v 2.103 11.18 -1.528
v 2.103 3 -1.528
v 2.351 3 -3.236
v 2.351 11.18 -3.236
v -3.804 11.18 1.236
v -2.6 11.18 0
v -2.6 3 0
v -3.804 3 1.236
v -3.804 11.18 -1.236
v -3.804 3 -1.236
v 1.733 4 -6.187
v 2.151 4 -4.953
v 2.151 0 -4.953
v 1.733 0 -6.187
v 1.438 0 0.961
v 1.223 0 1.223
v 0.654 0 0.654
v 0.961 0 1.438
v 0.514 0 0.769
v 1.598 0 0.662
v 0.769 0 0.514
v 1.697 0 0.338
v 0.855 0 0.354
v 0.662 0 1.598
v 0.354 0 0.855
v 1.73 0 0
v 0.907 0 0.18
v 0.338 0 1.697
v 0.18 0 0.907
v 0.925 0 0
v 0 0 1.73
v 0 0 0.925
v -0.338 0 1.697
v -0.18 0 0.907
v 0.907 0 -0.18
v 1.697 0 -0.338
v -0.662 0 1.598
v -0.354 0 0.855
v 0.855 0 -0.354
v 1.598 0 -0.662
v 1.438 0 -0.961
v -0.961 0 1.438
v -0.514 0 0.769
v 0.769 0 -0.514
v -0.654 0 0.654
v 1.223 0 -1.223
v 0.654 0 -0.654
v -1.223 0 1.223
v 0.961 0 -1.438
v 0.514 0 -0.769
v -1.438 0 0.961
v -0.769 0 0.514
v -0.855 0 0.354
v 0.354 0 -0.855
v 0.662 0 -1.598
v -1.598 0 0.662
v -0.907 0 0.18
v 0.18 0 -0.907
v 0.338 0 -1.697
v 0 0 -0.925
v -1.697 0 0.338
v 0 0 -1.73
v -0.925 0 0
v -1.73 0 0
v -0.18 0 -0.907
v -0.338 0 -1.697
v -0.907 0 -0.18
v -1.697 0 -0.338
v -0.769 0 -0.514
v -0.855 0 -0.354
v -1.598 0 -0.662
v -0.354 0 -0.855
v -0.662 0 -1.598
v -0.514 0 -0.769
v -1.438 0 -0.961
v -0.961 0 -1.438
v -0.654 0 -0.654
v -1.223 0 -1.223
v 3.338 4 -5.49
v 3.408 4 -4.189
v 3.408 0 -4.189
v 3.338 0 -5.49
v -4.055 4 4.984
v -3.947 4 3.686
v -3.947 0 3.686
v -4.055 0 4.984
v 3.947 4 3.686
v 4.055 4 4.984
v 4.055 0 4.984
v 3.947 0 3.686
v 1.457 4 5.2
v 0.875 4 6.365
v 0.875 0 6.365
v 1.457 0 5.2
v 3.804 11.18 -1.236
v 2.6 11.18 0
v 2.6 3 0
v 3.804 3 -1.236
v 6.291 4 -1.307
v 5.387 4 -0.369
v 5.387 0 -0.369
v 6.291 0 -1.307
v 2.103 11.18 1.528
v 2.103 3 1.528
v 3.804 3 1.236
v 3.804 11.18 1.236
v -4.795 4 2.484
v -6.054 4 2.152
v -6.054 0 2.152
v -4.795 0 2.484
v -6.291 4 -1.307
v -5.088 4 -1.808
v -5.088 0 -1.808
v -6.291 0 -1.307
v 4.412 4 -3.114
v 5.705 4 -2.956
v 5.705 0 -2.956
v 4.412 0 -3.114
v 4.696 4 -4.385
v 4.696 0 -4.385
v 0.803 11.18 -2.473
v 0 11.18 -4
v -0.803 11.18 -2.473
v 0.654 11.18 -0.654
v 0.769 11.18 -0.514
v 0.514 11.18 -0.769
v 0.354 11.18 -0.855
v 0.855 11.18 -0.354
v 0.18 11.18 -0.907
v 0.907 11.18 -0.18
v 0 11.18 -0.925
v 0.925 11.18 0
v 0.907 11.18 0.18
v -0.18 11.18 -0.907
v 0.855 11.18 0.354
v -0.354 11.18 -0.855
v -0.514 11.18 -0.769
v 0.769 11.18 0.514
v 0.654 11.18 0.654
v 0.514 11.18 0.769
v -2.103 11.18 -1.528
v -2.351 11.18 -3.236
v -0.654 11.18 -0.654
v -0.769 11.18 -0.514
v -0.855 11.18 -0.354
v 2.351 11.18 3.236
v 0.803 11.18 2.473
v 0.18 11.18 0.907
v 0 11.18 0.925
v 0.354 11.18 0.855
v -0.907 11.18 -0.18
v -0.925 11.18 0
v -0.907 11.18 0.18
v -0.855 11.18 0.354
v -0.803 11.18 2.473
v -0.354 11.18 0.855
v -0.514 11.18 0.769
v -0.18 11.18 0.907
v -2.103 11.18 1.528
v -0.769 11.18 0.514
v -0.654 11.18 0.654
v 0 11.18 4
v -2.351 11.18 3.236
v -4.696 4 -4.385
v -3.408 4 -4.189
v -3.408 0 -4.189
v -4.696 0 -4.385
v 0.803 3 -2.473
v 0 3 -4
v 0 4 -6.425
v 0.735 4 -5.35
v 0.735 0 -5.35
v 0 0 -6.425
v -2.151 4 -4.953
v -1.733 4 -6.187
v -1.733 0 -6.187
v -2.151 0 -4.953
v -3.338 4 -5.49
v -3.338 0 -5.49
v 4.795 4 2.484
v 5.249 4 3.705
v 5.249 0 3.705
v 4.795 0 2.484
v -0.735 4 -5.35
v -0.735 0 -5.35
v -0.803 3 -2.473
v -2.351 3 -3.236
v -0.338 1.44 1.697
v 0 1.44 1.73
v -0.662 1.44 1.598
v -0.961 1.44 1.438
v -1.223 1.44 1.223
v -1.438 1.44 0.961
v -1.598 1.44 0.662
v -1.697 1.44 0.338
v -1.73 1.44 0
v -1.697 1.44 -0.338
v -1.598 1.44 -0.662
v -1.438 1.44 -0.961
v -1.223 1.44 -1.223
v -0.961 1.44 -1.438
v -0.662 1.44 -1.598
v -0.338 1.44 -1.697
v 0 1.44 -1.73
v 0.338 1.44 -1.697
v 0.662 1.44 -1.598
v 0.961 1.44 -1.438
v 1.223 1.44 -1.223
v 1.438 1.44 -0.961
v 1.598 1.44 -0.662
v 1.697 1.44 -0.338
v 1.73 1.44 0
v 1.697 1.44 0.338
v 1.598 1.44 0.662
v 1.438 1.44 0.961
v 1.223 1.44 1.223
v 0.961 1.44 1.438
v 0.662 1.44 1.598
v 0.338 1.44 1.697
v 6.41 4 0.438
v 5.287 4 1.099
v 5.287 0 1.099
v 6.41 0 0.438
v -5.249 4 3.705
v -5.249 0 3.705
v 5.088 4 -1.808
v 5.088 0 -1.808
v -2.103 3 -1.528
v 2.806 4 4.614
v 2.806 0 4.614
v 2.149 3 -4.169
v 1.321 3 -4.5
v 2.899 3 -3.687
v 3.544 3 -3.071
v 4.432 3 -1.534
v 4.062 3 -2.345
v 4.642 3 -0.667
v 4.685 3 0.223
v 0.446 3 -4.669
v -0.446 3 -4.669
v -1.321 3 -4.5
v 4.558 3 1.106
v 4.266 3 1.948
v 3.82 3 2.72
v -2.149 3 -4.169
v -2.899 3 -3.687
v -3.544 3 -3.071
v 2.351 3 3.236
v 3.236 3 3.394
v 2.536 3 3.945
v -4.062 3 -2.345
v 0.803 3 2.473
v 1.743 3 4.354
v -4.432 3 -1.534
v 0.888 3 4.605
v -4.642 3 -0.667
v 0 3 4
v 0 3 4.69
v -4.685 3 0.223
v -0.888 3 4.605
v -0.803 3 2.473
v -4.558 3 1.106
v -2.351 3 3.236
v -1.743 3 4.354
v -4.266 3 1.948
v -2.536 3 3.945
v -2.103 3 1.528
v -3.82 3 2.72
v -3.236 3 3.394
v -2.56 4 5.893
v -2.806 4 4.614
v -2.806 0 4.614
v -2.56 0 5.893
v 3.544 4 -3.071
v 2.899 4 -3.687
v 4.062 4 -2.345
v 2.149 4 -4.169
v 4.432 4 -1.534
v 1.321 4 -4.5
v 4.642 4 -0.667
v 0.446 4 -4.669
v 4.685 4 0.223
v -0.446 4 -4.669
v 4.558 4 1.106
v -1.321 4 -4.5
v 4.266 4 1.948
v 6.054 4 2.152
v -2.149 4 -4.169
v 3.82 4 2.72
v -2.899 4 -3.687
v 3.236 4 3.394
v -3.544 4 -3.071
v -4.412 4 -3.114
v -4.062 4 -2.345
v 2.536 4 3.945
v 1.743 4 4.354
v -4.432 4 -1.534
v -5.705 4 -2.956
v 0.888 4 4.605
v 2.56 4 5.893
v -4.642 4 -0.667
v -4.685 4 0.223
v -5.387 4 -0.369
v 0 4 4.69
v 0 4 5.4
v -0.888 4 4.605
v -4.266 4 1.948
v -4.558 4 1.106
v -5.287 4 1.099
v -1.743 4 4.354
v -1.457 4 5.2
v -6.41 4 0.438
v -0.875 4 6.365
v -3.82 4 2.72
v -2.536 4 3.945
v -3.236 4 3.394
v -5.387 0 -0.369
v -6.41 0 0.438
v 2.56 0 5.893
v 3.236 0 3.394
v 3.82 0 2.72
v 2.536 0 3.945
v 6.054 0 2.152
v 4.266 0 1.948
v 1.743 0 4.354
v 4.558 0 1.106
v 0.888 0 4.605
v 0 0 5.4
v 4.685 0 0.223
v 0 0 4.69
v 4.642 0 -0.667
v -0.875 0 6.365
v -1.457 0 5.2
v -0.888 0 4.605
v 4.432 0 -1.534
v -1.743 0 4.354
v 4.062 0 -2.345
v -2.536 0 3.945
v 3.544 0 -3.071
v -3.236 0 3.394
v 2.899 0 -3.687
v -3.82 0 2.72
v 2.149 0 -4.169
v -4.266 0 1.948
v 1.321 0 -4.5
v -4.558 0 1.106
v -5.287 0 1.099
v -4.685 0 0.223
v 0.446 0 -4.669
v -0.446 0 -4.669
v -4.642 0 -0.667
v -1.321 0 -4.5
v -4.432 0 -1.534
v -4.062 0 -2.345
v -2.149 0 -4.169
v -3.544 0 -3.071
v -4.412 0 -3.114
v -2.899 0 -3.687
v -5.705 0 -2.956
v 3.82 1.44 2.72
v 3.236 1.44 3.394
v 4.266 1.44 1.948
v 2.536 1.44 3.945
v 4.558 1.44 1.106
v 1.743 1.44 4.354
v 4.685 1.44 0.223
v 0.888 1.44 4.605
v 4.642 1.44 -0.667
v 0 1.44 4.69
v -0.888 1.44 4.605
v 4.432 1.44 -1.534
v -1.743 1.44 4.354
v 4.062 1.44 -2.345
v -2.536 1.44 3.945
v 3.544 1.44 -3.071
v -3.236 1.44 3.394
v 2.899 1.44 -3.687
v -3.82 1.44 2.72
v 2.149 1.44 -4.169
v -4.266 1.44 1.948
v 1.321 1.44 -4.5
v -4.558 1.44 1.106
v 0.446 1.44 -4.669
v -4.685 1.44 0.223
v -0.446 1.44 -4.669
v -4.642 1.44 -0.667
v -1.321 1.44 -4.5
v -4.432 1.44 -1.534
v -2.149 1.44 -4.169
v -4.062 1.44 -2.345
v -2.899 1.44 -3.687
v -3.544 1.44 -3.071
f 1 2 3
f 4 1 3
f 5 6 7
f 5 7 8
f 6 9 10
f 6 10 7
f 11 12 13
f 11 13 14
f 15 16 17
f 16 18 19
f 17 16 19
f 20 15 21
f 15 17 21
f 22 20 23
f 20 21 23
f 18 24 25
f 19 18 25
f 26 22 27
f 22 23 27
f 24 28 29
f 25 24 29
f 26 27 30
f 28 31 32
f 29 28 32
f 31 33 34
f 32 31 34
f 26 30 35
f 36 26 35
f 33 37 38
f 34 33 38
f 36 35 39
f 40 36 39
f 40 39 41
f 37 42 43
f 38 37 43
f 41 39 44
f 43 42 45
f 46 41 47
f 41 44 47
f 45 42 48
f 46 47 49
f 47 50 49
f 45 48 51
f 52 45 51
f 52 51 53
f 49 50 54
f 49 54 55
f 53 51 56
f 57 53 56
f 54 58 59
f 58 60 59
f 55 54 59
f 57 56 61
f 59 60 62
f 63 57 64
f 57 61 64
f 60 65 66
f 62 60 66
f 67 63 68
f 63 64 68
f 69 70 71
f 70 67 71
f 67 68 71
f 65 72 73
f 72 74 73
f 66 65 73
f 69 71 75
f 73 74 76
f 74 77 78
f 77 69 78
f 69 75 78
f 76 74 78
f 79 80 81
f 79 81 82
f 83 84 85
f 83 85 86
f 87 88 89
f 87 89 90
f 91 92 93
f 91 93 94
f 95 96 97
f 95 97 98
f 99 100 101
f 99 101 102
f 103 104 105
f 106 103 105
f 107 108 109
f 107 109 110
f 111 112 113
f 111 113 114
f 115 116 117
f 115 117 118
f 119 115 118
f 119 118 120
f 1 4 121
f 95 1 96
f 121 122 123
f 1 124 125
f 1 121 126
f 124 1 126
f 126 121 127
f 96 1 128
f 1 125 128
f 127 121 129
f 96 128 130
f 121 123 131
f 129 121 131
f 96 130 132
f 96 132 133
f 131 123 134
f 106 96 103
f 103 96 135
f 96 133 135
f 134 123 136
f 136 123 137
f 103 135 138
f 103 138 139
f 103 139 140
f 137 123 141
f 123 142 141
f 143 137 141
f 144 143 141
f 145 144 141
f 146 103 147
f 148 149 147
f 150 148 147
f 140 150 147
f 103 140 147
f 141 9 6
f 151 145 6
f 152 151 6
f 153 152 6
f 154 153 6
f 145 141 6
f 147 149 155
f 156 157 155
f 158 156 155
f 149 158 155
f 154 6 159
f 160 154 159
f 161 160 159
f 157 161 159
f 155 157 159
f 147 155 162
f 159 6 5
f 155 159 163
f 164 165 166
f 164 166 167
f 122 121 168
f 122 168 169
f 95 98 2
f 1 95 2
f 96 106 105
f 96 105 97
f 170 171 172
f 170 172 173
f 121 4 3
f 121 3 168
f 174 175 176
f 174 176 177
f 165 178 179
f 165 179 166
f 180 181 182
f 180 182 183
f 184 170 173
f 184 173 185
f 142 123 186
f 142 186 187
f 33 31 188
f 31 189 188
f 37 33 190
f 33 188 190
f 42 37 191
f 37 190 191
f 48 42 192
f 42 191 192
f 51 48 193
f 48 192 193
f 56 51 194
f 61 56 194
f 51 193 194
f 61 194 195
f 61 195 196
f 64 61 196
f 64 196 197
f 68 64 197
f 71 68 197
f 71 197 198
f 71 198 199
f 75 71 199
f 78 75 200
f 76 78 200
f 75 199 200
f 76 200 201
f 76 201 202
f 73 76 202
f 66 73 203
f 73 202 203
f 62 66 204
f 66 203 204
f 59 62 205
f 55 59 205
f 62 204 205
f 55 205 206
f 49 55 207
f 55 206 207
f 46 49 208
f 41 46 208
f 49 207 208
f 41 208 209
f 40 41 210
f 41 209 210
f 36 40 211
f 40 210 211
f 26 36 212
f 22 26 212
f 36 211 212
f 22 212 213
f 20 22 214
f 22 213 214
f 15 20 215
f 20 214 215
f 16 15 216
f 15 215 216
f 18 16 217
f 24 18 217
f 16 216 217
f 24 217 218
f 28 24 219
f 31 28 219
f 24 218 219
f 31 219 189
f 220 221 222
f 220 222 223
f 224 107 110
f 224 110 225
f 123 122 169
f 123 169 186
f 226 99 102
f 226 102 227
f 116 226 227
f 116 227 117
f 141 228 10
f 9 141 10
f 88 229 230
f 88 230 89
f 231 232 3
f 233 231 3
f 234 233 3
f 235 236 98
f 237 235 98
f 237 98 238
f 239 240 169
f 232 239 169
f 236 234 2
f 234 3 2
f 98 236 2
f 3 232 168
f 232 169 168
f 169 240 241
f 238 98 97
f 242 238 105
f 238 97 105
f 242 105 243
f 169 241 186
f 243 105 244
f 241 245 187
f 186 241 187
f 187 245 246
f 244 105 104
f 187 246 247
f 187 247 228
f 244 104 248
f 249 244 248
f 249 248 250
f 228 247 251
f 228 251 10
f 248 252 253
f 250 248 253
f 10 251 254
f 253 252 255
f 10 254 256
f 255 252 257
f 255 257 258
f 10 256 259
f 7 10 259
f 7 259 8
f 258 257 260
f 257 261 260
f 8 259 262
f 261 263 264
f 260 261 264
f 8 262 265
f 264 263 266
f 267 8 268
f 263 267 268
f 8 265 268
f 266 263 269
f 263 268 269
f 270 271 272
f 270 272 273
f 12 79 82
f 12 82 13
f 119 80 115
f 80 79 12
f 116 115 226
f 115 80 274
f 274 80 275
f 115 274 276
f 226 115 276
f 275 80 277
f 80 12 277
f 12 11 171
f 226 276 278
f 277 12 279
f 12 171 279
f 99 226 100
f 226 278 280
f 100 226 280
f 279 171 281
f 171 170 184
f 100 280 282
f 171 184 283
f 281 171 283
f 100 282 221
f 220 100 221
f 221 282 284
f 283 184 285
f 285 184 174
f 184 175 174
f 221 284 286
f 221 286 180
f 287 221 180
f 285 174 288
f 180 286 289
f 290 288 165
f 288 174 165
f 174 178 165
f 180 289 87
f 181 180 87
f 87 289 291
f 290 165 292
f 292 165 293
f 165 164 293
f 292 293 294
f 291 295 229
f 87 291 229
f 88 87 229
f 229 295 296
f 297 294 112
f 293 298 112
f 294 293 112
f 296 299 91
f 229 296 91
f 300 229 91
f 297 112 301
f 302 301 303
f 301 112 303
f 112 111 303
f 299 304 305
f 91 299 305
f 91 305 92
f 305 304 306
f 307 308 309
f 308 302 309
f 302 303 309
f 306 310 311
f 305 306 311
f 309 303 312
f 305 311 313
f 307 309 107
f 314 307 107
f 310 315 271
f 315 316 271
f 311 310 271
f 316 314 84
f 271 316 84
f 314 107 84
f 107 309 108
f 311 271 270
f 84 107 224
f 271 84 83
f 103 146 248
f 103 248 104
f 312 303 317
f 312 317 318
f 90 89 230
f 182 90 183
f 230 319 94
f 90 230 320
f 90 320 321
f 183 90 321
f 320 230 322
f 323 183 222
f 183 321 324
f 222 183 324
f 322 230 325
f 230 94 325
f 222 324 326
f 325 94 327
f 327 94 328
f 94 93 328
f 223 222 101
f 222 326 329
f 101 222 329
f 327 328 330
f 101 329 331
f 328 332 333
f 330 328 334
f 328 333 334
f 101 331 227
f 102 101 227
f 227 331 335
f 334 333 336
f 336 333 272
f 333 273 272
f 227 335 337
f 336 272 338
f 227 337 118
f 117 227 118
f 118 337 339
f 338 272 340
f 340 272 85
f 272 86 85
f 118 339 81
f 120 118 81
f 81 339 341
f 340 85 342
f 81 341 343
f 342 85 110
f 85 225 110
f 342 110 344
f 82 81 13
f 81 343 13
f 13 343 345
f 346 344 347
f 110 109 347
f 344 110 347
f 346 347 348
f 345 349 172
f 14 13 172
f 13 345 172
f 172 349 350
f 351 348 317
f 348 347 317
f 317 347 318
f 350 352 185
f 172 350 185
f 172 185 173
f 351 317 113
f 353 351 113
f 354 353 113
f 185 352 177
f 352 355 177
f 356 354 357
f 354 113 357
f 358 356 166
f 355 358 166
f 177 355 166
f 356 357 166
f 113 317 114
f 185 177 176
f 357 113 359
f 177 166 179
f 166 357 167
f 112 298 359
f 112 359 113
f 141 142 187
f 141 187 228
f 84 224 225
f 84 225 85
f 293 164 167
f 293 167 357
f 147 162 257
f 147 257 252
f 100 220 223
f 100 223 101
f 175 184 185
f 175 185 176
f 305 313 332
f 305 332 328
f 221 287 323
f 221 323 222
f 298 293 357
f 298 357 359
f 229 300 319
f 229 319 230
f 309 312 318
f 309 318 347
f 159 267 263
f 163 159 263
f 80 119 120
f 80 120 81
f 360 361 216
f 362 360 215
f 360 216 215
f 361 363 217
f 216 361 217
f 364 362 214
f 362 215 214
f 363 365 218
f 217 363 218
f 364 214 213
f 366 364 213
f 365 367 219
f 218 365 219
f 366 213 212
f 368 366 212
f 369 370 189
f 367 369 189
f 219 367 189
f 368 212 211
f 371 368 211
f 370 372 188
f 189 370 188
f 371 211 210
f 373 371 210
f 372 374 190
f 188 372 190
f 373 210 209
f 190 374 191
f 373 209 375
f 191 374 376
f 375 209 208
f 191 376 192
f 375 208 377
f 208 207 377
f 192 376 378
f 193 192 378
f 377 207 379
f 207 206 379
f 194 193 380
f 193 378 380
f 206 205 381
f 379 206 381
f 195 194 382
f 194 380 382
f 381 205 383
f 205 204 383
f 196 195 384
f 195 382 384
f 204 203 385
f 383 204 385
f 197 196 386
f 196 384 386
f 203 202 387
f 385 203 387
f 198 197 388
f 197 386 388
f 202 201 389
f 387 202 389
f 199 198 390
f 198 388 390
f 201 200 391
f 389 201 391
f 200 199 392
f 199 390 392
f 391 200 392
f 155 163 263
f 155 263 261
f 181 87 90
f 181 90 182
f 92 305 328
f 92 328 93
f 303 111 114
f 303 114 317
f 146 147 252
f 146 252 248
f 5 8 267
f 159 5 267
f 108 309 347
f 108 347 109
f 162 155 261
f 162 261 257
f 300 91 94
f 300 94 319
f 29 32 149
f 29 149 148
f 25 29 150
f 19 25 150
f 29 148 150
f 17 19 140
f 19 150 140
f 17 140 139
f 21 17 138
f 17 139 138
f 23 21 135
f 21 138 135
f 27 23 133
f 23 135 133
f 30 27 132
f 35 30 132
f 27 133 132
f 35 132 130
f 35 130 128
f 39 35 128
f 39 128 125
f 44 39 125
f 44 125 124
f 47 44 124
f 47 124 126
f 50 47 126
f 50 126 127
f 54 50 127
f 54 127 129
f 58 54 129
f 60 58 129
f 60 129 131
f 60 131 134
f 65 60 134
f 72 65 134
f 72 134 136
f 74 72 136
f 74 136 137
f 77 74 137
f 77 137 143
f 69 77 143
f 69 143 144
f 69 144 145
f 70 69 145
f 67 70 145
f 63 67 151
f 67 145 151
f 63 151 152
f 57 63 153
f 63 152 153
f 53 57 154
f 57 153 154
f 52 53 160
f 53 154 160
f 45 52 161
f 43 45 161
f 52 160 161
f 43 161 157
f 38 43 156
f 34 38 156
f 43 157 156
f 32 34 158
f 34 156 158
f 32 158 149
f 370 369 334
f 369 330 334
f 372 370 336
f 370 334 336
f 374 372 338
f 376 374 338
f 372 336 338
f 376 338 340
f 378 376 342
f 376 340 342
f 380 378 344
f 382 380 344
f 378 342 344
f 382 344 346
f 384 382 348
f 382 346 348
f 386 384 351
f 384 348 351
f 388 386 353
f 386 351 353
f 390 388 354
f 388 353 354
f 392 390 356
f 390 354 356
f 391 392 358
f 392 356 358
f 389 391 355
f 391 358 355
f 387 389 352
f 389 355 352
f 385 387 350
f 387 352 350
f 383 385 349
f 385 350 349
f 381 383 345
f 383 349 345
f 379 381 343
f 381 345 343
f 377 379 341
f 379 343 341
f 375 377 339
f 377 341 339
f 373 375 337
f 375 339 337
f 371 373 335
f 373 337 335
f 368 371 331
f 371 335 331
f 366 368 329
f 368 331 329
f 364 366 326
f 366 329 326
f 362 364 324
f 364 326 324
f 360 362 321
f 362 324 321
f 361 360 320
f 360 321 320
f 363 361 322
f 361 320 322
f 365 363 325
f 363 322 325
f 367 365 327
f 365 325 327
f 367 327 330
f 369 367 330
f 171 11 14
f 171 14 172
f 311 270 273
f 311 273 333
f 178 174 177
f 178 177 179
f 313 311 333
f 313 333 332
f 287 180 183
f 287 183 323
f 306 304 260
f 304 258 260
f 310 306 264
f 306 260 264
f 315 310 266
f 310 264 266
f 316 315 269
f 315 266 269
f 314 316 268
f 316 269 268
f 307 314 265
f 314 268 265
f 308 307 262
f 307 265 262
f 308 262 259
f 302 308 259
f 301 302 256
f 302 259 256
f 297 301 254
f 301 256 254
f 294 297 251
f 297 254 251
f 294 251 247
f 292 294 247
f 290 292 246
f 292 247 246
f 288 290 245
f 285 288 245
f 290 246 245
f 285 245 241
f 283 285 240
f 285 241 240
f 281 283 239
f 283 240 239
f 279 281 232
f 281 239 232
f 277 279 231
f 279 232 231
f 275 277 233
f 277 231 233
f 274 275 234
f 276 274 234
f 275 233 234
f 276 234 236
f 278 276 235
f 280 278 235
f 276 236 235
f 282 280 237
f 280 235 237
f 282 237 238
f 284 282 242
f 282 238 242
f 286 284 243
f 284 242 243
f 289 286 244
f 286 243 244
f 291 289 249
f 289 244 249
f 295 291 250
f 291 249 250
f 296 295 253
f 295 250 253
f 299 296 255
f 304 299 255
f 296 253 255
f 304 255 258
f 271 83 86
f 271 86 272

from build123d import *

# Parameters (mm, degrees)
SKETCH2_R          = 6.925
CUT_EXTRUDE1_DEPTH = 12.580744795
SKETCH3_R          = 4.5
CUT_EXTRUDE2_DEPTH = 8.18
SKETCH4_R          = 0.925
CUT_EXTRUDE3_DEPTH = 15.400048785


with BuildPart() as part:
    # Sketch1 → Revolve1 (revolve)
    with BuildSketch(Plane.XY, mode=Mode.PRIVATE) as revolve1_sk:
        Polygon((0, 11.18), (0, 0), (1.73, 0), (1.73, 1.44), (4.69, 1.44), (4.69, 0), (6.425, 0), (6.425, 4), (4.69, 4), (4.69, 3), (4, 3), (4, 11.18), align=None)
    revolve(revolve1_sk.sketch.rotate(Axis((0, 11.18, 0), (0, -1, 0)), 90), axis=Axis((0, 11.18, 0), (0, -1, 0)))

    # Sketch2 → Cut-Extrude1 (cut, through all)
    with BuildSketch(Plane(origin=(0, 4, 0), x_dir=(1, 0, 0), z_dir=(0, 1, 0))):
        Circle(SKETCH2_R)
        Polygon((0, 6.425), (-0.735299905, 5.349704109), (-1.733444255, 6.186743571), (-2.151365885, 4.952941028), (-3.338326879, 5.489644674), (-3.407874899, 4.18884097), (-4.69562107, 4.385403945), (-4.411637422, 3.114073739), (-5.704662528, 2.955917867), (-5.088208979, 1.808349906), (-6.290615263, 1.307204884), (-5.387411354, 0.368509032), (-6.410021842, -0.438457506), (-5.287054073, -1.09866247), (-6.054026425, -2.151601508), (-4.794580179, -2.484351204), (-5.249031563, -3.70517107), (-3.946514207, -3.685786973), (-4.054740042, -4.983945043), (-2.80575333, -4.613864785), (-2.559727002, -5.893082612), (-1.456902564, -5.199753352), (-0.87487072, -6.365157203), (0, -5.4), (0.87487072, -6.365157203), (1.456902564, -5.199753352), (2.559727002, -5.893082612), (2.80575333, -4.613864785), (4.054740042, -4.983945043), (3.946514207, -3.685786973), (5.249031563, -3.70517107), (4.794580179, -2.484351204), (6.054026425, -2.151601508), (5.287054073, -1.09866247), (6.410021842, -0.438457506), (5.387411354, 0.368509032), (6.290615263, 1.307204884), (5.088208979, 1.808349906), (5.704662528, 2.955917867), (4.411637422, 3.114073739), (4.69562107, 4.385403945), (3.407874899, 4.18884097), (3.338326879, 5.489644674), (2.151365885, 4.952941028), (1.733444255, 6.186743571), (0.735299905, 5.349704109), align=None, mode=Mode.SUBTRACT)
    extrude(amount=-CUT_EXTRUDE1_DEPTH, mode=Mode.SUBTRACT)

    # Sketch3 → Cut-Extrude2 (cut)
    with BuildSketch(Plane(origin=(0, 11.18, 0), x_dir=(1, 0, 0), z_dir=(0, 1, 0))):
        Circle(SKETCH3_R)
        Polygon((0, 4), (-0.803444185, 2.472746942), (-2.351141009, 3.236067977), (-2.103444185, 1.528241656), (-3.804226065, 1.236067977), (-2.6, 0), (-3.804226065, -1.236067977), (-2.103444185, -1.528241656), (-2.351141009, -3.236067977), (-0.803444185, -2.472746942), (0, -4), (0.803444185, -2.472746942), (2.351141009, -3.236067977), (2.103444185, -1.528241656), (3.804226065, -1.236067977), (2.6, 0), (3.804226065, 1.236067977), (2.103444185, 1.528241656), (2.351141009, 3.236067977), (0.803444185, 2.472746942), align=None, mode=Mode.SUBTRACT)
    extrude(amount=-CUT_EXTRUDE2_DEPTH, mode=Mode.SUBTRACT)

    # Sketch4 → Cut-Extrude3 (cut, through all)
    with BuildSketch(Plane(origin=(0, 11.18, 0), x_dir=(1, 0, 0), z_dir=(0, 1, 0))):
        with Locations(Location((0, 0, 0), (0, 0, 270))):
            Circle(SKETCH4_R)
    extrude(amount=-CUT_EXTRUDE3_DEPTH, mode=Mode.SUBTRACT)


solid = part.part
